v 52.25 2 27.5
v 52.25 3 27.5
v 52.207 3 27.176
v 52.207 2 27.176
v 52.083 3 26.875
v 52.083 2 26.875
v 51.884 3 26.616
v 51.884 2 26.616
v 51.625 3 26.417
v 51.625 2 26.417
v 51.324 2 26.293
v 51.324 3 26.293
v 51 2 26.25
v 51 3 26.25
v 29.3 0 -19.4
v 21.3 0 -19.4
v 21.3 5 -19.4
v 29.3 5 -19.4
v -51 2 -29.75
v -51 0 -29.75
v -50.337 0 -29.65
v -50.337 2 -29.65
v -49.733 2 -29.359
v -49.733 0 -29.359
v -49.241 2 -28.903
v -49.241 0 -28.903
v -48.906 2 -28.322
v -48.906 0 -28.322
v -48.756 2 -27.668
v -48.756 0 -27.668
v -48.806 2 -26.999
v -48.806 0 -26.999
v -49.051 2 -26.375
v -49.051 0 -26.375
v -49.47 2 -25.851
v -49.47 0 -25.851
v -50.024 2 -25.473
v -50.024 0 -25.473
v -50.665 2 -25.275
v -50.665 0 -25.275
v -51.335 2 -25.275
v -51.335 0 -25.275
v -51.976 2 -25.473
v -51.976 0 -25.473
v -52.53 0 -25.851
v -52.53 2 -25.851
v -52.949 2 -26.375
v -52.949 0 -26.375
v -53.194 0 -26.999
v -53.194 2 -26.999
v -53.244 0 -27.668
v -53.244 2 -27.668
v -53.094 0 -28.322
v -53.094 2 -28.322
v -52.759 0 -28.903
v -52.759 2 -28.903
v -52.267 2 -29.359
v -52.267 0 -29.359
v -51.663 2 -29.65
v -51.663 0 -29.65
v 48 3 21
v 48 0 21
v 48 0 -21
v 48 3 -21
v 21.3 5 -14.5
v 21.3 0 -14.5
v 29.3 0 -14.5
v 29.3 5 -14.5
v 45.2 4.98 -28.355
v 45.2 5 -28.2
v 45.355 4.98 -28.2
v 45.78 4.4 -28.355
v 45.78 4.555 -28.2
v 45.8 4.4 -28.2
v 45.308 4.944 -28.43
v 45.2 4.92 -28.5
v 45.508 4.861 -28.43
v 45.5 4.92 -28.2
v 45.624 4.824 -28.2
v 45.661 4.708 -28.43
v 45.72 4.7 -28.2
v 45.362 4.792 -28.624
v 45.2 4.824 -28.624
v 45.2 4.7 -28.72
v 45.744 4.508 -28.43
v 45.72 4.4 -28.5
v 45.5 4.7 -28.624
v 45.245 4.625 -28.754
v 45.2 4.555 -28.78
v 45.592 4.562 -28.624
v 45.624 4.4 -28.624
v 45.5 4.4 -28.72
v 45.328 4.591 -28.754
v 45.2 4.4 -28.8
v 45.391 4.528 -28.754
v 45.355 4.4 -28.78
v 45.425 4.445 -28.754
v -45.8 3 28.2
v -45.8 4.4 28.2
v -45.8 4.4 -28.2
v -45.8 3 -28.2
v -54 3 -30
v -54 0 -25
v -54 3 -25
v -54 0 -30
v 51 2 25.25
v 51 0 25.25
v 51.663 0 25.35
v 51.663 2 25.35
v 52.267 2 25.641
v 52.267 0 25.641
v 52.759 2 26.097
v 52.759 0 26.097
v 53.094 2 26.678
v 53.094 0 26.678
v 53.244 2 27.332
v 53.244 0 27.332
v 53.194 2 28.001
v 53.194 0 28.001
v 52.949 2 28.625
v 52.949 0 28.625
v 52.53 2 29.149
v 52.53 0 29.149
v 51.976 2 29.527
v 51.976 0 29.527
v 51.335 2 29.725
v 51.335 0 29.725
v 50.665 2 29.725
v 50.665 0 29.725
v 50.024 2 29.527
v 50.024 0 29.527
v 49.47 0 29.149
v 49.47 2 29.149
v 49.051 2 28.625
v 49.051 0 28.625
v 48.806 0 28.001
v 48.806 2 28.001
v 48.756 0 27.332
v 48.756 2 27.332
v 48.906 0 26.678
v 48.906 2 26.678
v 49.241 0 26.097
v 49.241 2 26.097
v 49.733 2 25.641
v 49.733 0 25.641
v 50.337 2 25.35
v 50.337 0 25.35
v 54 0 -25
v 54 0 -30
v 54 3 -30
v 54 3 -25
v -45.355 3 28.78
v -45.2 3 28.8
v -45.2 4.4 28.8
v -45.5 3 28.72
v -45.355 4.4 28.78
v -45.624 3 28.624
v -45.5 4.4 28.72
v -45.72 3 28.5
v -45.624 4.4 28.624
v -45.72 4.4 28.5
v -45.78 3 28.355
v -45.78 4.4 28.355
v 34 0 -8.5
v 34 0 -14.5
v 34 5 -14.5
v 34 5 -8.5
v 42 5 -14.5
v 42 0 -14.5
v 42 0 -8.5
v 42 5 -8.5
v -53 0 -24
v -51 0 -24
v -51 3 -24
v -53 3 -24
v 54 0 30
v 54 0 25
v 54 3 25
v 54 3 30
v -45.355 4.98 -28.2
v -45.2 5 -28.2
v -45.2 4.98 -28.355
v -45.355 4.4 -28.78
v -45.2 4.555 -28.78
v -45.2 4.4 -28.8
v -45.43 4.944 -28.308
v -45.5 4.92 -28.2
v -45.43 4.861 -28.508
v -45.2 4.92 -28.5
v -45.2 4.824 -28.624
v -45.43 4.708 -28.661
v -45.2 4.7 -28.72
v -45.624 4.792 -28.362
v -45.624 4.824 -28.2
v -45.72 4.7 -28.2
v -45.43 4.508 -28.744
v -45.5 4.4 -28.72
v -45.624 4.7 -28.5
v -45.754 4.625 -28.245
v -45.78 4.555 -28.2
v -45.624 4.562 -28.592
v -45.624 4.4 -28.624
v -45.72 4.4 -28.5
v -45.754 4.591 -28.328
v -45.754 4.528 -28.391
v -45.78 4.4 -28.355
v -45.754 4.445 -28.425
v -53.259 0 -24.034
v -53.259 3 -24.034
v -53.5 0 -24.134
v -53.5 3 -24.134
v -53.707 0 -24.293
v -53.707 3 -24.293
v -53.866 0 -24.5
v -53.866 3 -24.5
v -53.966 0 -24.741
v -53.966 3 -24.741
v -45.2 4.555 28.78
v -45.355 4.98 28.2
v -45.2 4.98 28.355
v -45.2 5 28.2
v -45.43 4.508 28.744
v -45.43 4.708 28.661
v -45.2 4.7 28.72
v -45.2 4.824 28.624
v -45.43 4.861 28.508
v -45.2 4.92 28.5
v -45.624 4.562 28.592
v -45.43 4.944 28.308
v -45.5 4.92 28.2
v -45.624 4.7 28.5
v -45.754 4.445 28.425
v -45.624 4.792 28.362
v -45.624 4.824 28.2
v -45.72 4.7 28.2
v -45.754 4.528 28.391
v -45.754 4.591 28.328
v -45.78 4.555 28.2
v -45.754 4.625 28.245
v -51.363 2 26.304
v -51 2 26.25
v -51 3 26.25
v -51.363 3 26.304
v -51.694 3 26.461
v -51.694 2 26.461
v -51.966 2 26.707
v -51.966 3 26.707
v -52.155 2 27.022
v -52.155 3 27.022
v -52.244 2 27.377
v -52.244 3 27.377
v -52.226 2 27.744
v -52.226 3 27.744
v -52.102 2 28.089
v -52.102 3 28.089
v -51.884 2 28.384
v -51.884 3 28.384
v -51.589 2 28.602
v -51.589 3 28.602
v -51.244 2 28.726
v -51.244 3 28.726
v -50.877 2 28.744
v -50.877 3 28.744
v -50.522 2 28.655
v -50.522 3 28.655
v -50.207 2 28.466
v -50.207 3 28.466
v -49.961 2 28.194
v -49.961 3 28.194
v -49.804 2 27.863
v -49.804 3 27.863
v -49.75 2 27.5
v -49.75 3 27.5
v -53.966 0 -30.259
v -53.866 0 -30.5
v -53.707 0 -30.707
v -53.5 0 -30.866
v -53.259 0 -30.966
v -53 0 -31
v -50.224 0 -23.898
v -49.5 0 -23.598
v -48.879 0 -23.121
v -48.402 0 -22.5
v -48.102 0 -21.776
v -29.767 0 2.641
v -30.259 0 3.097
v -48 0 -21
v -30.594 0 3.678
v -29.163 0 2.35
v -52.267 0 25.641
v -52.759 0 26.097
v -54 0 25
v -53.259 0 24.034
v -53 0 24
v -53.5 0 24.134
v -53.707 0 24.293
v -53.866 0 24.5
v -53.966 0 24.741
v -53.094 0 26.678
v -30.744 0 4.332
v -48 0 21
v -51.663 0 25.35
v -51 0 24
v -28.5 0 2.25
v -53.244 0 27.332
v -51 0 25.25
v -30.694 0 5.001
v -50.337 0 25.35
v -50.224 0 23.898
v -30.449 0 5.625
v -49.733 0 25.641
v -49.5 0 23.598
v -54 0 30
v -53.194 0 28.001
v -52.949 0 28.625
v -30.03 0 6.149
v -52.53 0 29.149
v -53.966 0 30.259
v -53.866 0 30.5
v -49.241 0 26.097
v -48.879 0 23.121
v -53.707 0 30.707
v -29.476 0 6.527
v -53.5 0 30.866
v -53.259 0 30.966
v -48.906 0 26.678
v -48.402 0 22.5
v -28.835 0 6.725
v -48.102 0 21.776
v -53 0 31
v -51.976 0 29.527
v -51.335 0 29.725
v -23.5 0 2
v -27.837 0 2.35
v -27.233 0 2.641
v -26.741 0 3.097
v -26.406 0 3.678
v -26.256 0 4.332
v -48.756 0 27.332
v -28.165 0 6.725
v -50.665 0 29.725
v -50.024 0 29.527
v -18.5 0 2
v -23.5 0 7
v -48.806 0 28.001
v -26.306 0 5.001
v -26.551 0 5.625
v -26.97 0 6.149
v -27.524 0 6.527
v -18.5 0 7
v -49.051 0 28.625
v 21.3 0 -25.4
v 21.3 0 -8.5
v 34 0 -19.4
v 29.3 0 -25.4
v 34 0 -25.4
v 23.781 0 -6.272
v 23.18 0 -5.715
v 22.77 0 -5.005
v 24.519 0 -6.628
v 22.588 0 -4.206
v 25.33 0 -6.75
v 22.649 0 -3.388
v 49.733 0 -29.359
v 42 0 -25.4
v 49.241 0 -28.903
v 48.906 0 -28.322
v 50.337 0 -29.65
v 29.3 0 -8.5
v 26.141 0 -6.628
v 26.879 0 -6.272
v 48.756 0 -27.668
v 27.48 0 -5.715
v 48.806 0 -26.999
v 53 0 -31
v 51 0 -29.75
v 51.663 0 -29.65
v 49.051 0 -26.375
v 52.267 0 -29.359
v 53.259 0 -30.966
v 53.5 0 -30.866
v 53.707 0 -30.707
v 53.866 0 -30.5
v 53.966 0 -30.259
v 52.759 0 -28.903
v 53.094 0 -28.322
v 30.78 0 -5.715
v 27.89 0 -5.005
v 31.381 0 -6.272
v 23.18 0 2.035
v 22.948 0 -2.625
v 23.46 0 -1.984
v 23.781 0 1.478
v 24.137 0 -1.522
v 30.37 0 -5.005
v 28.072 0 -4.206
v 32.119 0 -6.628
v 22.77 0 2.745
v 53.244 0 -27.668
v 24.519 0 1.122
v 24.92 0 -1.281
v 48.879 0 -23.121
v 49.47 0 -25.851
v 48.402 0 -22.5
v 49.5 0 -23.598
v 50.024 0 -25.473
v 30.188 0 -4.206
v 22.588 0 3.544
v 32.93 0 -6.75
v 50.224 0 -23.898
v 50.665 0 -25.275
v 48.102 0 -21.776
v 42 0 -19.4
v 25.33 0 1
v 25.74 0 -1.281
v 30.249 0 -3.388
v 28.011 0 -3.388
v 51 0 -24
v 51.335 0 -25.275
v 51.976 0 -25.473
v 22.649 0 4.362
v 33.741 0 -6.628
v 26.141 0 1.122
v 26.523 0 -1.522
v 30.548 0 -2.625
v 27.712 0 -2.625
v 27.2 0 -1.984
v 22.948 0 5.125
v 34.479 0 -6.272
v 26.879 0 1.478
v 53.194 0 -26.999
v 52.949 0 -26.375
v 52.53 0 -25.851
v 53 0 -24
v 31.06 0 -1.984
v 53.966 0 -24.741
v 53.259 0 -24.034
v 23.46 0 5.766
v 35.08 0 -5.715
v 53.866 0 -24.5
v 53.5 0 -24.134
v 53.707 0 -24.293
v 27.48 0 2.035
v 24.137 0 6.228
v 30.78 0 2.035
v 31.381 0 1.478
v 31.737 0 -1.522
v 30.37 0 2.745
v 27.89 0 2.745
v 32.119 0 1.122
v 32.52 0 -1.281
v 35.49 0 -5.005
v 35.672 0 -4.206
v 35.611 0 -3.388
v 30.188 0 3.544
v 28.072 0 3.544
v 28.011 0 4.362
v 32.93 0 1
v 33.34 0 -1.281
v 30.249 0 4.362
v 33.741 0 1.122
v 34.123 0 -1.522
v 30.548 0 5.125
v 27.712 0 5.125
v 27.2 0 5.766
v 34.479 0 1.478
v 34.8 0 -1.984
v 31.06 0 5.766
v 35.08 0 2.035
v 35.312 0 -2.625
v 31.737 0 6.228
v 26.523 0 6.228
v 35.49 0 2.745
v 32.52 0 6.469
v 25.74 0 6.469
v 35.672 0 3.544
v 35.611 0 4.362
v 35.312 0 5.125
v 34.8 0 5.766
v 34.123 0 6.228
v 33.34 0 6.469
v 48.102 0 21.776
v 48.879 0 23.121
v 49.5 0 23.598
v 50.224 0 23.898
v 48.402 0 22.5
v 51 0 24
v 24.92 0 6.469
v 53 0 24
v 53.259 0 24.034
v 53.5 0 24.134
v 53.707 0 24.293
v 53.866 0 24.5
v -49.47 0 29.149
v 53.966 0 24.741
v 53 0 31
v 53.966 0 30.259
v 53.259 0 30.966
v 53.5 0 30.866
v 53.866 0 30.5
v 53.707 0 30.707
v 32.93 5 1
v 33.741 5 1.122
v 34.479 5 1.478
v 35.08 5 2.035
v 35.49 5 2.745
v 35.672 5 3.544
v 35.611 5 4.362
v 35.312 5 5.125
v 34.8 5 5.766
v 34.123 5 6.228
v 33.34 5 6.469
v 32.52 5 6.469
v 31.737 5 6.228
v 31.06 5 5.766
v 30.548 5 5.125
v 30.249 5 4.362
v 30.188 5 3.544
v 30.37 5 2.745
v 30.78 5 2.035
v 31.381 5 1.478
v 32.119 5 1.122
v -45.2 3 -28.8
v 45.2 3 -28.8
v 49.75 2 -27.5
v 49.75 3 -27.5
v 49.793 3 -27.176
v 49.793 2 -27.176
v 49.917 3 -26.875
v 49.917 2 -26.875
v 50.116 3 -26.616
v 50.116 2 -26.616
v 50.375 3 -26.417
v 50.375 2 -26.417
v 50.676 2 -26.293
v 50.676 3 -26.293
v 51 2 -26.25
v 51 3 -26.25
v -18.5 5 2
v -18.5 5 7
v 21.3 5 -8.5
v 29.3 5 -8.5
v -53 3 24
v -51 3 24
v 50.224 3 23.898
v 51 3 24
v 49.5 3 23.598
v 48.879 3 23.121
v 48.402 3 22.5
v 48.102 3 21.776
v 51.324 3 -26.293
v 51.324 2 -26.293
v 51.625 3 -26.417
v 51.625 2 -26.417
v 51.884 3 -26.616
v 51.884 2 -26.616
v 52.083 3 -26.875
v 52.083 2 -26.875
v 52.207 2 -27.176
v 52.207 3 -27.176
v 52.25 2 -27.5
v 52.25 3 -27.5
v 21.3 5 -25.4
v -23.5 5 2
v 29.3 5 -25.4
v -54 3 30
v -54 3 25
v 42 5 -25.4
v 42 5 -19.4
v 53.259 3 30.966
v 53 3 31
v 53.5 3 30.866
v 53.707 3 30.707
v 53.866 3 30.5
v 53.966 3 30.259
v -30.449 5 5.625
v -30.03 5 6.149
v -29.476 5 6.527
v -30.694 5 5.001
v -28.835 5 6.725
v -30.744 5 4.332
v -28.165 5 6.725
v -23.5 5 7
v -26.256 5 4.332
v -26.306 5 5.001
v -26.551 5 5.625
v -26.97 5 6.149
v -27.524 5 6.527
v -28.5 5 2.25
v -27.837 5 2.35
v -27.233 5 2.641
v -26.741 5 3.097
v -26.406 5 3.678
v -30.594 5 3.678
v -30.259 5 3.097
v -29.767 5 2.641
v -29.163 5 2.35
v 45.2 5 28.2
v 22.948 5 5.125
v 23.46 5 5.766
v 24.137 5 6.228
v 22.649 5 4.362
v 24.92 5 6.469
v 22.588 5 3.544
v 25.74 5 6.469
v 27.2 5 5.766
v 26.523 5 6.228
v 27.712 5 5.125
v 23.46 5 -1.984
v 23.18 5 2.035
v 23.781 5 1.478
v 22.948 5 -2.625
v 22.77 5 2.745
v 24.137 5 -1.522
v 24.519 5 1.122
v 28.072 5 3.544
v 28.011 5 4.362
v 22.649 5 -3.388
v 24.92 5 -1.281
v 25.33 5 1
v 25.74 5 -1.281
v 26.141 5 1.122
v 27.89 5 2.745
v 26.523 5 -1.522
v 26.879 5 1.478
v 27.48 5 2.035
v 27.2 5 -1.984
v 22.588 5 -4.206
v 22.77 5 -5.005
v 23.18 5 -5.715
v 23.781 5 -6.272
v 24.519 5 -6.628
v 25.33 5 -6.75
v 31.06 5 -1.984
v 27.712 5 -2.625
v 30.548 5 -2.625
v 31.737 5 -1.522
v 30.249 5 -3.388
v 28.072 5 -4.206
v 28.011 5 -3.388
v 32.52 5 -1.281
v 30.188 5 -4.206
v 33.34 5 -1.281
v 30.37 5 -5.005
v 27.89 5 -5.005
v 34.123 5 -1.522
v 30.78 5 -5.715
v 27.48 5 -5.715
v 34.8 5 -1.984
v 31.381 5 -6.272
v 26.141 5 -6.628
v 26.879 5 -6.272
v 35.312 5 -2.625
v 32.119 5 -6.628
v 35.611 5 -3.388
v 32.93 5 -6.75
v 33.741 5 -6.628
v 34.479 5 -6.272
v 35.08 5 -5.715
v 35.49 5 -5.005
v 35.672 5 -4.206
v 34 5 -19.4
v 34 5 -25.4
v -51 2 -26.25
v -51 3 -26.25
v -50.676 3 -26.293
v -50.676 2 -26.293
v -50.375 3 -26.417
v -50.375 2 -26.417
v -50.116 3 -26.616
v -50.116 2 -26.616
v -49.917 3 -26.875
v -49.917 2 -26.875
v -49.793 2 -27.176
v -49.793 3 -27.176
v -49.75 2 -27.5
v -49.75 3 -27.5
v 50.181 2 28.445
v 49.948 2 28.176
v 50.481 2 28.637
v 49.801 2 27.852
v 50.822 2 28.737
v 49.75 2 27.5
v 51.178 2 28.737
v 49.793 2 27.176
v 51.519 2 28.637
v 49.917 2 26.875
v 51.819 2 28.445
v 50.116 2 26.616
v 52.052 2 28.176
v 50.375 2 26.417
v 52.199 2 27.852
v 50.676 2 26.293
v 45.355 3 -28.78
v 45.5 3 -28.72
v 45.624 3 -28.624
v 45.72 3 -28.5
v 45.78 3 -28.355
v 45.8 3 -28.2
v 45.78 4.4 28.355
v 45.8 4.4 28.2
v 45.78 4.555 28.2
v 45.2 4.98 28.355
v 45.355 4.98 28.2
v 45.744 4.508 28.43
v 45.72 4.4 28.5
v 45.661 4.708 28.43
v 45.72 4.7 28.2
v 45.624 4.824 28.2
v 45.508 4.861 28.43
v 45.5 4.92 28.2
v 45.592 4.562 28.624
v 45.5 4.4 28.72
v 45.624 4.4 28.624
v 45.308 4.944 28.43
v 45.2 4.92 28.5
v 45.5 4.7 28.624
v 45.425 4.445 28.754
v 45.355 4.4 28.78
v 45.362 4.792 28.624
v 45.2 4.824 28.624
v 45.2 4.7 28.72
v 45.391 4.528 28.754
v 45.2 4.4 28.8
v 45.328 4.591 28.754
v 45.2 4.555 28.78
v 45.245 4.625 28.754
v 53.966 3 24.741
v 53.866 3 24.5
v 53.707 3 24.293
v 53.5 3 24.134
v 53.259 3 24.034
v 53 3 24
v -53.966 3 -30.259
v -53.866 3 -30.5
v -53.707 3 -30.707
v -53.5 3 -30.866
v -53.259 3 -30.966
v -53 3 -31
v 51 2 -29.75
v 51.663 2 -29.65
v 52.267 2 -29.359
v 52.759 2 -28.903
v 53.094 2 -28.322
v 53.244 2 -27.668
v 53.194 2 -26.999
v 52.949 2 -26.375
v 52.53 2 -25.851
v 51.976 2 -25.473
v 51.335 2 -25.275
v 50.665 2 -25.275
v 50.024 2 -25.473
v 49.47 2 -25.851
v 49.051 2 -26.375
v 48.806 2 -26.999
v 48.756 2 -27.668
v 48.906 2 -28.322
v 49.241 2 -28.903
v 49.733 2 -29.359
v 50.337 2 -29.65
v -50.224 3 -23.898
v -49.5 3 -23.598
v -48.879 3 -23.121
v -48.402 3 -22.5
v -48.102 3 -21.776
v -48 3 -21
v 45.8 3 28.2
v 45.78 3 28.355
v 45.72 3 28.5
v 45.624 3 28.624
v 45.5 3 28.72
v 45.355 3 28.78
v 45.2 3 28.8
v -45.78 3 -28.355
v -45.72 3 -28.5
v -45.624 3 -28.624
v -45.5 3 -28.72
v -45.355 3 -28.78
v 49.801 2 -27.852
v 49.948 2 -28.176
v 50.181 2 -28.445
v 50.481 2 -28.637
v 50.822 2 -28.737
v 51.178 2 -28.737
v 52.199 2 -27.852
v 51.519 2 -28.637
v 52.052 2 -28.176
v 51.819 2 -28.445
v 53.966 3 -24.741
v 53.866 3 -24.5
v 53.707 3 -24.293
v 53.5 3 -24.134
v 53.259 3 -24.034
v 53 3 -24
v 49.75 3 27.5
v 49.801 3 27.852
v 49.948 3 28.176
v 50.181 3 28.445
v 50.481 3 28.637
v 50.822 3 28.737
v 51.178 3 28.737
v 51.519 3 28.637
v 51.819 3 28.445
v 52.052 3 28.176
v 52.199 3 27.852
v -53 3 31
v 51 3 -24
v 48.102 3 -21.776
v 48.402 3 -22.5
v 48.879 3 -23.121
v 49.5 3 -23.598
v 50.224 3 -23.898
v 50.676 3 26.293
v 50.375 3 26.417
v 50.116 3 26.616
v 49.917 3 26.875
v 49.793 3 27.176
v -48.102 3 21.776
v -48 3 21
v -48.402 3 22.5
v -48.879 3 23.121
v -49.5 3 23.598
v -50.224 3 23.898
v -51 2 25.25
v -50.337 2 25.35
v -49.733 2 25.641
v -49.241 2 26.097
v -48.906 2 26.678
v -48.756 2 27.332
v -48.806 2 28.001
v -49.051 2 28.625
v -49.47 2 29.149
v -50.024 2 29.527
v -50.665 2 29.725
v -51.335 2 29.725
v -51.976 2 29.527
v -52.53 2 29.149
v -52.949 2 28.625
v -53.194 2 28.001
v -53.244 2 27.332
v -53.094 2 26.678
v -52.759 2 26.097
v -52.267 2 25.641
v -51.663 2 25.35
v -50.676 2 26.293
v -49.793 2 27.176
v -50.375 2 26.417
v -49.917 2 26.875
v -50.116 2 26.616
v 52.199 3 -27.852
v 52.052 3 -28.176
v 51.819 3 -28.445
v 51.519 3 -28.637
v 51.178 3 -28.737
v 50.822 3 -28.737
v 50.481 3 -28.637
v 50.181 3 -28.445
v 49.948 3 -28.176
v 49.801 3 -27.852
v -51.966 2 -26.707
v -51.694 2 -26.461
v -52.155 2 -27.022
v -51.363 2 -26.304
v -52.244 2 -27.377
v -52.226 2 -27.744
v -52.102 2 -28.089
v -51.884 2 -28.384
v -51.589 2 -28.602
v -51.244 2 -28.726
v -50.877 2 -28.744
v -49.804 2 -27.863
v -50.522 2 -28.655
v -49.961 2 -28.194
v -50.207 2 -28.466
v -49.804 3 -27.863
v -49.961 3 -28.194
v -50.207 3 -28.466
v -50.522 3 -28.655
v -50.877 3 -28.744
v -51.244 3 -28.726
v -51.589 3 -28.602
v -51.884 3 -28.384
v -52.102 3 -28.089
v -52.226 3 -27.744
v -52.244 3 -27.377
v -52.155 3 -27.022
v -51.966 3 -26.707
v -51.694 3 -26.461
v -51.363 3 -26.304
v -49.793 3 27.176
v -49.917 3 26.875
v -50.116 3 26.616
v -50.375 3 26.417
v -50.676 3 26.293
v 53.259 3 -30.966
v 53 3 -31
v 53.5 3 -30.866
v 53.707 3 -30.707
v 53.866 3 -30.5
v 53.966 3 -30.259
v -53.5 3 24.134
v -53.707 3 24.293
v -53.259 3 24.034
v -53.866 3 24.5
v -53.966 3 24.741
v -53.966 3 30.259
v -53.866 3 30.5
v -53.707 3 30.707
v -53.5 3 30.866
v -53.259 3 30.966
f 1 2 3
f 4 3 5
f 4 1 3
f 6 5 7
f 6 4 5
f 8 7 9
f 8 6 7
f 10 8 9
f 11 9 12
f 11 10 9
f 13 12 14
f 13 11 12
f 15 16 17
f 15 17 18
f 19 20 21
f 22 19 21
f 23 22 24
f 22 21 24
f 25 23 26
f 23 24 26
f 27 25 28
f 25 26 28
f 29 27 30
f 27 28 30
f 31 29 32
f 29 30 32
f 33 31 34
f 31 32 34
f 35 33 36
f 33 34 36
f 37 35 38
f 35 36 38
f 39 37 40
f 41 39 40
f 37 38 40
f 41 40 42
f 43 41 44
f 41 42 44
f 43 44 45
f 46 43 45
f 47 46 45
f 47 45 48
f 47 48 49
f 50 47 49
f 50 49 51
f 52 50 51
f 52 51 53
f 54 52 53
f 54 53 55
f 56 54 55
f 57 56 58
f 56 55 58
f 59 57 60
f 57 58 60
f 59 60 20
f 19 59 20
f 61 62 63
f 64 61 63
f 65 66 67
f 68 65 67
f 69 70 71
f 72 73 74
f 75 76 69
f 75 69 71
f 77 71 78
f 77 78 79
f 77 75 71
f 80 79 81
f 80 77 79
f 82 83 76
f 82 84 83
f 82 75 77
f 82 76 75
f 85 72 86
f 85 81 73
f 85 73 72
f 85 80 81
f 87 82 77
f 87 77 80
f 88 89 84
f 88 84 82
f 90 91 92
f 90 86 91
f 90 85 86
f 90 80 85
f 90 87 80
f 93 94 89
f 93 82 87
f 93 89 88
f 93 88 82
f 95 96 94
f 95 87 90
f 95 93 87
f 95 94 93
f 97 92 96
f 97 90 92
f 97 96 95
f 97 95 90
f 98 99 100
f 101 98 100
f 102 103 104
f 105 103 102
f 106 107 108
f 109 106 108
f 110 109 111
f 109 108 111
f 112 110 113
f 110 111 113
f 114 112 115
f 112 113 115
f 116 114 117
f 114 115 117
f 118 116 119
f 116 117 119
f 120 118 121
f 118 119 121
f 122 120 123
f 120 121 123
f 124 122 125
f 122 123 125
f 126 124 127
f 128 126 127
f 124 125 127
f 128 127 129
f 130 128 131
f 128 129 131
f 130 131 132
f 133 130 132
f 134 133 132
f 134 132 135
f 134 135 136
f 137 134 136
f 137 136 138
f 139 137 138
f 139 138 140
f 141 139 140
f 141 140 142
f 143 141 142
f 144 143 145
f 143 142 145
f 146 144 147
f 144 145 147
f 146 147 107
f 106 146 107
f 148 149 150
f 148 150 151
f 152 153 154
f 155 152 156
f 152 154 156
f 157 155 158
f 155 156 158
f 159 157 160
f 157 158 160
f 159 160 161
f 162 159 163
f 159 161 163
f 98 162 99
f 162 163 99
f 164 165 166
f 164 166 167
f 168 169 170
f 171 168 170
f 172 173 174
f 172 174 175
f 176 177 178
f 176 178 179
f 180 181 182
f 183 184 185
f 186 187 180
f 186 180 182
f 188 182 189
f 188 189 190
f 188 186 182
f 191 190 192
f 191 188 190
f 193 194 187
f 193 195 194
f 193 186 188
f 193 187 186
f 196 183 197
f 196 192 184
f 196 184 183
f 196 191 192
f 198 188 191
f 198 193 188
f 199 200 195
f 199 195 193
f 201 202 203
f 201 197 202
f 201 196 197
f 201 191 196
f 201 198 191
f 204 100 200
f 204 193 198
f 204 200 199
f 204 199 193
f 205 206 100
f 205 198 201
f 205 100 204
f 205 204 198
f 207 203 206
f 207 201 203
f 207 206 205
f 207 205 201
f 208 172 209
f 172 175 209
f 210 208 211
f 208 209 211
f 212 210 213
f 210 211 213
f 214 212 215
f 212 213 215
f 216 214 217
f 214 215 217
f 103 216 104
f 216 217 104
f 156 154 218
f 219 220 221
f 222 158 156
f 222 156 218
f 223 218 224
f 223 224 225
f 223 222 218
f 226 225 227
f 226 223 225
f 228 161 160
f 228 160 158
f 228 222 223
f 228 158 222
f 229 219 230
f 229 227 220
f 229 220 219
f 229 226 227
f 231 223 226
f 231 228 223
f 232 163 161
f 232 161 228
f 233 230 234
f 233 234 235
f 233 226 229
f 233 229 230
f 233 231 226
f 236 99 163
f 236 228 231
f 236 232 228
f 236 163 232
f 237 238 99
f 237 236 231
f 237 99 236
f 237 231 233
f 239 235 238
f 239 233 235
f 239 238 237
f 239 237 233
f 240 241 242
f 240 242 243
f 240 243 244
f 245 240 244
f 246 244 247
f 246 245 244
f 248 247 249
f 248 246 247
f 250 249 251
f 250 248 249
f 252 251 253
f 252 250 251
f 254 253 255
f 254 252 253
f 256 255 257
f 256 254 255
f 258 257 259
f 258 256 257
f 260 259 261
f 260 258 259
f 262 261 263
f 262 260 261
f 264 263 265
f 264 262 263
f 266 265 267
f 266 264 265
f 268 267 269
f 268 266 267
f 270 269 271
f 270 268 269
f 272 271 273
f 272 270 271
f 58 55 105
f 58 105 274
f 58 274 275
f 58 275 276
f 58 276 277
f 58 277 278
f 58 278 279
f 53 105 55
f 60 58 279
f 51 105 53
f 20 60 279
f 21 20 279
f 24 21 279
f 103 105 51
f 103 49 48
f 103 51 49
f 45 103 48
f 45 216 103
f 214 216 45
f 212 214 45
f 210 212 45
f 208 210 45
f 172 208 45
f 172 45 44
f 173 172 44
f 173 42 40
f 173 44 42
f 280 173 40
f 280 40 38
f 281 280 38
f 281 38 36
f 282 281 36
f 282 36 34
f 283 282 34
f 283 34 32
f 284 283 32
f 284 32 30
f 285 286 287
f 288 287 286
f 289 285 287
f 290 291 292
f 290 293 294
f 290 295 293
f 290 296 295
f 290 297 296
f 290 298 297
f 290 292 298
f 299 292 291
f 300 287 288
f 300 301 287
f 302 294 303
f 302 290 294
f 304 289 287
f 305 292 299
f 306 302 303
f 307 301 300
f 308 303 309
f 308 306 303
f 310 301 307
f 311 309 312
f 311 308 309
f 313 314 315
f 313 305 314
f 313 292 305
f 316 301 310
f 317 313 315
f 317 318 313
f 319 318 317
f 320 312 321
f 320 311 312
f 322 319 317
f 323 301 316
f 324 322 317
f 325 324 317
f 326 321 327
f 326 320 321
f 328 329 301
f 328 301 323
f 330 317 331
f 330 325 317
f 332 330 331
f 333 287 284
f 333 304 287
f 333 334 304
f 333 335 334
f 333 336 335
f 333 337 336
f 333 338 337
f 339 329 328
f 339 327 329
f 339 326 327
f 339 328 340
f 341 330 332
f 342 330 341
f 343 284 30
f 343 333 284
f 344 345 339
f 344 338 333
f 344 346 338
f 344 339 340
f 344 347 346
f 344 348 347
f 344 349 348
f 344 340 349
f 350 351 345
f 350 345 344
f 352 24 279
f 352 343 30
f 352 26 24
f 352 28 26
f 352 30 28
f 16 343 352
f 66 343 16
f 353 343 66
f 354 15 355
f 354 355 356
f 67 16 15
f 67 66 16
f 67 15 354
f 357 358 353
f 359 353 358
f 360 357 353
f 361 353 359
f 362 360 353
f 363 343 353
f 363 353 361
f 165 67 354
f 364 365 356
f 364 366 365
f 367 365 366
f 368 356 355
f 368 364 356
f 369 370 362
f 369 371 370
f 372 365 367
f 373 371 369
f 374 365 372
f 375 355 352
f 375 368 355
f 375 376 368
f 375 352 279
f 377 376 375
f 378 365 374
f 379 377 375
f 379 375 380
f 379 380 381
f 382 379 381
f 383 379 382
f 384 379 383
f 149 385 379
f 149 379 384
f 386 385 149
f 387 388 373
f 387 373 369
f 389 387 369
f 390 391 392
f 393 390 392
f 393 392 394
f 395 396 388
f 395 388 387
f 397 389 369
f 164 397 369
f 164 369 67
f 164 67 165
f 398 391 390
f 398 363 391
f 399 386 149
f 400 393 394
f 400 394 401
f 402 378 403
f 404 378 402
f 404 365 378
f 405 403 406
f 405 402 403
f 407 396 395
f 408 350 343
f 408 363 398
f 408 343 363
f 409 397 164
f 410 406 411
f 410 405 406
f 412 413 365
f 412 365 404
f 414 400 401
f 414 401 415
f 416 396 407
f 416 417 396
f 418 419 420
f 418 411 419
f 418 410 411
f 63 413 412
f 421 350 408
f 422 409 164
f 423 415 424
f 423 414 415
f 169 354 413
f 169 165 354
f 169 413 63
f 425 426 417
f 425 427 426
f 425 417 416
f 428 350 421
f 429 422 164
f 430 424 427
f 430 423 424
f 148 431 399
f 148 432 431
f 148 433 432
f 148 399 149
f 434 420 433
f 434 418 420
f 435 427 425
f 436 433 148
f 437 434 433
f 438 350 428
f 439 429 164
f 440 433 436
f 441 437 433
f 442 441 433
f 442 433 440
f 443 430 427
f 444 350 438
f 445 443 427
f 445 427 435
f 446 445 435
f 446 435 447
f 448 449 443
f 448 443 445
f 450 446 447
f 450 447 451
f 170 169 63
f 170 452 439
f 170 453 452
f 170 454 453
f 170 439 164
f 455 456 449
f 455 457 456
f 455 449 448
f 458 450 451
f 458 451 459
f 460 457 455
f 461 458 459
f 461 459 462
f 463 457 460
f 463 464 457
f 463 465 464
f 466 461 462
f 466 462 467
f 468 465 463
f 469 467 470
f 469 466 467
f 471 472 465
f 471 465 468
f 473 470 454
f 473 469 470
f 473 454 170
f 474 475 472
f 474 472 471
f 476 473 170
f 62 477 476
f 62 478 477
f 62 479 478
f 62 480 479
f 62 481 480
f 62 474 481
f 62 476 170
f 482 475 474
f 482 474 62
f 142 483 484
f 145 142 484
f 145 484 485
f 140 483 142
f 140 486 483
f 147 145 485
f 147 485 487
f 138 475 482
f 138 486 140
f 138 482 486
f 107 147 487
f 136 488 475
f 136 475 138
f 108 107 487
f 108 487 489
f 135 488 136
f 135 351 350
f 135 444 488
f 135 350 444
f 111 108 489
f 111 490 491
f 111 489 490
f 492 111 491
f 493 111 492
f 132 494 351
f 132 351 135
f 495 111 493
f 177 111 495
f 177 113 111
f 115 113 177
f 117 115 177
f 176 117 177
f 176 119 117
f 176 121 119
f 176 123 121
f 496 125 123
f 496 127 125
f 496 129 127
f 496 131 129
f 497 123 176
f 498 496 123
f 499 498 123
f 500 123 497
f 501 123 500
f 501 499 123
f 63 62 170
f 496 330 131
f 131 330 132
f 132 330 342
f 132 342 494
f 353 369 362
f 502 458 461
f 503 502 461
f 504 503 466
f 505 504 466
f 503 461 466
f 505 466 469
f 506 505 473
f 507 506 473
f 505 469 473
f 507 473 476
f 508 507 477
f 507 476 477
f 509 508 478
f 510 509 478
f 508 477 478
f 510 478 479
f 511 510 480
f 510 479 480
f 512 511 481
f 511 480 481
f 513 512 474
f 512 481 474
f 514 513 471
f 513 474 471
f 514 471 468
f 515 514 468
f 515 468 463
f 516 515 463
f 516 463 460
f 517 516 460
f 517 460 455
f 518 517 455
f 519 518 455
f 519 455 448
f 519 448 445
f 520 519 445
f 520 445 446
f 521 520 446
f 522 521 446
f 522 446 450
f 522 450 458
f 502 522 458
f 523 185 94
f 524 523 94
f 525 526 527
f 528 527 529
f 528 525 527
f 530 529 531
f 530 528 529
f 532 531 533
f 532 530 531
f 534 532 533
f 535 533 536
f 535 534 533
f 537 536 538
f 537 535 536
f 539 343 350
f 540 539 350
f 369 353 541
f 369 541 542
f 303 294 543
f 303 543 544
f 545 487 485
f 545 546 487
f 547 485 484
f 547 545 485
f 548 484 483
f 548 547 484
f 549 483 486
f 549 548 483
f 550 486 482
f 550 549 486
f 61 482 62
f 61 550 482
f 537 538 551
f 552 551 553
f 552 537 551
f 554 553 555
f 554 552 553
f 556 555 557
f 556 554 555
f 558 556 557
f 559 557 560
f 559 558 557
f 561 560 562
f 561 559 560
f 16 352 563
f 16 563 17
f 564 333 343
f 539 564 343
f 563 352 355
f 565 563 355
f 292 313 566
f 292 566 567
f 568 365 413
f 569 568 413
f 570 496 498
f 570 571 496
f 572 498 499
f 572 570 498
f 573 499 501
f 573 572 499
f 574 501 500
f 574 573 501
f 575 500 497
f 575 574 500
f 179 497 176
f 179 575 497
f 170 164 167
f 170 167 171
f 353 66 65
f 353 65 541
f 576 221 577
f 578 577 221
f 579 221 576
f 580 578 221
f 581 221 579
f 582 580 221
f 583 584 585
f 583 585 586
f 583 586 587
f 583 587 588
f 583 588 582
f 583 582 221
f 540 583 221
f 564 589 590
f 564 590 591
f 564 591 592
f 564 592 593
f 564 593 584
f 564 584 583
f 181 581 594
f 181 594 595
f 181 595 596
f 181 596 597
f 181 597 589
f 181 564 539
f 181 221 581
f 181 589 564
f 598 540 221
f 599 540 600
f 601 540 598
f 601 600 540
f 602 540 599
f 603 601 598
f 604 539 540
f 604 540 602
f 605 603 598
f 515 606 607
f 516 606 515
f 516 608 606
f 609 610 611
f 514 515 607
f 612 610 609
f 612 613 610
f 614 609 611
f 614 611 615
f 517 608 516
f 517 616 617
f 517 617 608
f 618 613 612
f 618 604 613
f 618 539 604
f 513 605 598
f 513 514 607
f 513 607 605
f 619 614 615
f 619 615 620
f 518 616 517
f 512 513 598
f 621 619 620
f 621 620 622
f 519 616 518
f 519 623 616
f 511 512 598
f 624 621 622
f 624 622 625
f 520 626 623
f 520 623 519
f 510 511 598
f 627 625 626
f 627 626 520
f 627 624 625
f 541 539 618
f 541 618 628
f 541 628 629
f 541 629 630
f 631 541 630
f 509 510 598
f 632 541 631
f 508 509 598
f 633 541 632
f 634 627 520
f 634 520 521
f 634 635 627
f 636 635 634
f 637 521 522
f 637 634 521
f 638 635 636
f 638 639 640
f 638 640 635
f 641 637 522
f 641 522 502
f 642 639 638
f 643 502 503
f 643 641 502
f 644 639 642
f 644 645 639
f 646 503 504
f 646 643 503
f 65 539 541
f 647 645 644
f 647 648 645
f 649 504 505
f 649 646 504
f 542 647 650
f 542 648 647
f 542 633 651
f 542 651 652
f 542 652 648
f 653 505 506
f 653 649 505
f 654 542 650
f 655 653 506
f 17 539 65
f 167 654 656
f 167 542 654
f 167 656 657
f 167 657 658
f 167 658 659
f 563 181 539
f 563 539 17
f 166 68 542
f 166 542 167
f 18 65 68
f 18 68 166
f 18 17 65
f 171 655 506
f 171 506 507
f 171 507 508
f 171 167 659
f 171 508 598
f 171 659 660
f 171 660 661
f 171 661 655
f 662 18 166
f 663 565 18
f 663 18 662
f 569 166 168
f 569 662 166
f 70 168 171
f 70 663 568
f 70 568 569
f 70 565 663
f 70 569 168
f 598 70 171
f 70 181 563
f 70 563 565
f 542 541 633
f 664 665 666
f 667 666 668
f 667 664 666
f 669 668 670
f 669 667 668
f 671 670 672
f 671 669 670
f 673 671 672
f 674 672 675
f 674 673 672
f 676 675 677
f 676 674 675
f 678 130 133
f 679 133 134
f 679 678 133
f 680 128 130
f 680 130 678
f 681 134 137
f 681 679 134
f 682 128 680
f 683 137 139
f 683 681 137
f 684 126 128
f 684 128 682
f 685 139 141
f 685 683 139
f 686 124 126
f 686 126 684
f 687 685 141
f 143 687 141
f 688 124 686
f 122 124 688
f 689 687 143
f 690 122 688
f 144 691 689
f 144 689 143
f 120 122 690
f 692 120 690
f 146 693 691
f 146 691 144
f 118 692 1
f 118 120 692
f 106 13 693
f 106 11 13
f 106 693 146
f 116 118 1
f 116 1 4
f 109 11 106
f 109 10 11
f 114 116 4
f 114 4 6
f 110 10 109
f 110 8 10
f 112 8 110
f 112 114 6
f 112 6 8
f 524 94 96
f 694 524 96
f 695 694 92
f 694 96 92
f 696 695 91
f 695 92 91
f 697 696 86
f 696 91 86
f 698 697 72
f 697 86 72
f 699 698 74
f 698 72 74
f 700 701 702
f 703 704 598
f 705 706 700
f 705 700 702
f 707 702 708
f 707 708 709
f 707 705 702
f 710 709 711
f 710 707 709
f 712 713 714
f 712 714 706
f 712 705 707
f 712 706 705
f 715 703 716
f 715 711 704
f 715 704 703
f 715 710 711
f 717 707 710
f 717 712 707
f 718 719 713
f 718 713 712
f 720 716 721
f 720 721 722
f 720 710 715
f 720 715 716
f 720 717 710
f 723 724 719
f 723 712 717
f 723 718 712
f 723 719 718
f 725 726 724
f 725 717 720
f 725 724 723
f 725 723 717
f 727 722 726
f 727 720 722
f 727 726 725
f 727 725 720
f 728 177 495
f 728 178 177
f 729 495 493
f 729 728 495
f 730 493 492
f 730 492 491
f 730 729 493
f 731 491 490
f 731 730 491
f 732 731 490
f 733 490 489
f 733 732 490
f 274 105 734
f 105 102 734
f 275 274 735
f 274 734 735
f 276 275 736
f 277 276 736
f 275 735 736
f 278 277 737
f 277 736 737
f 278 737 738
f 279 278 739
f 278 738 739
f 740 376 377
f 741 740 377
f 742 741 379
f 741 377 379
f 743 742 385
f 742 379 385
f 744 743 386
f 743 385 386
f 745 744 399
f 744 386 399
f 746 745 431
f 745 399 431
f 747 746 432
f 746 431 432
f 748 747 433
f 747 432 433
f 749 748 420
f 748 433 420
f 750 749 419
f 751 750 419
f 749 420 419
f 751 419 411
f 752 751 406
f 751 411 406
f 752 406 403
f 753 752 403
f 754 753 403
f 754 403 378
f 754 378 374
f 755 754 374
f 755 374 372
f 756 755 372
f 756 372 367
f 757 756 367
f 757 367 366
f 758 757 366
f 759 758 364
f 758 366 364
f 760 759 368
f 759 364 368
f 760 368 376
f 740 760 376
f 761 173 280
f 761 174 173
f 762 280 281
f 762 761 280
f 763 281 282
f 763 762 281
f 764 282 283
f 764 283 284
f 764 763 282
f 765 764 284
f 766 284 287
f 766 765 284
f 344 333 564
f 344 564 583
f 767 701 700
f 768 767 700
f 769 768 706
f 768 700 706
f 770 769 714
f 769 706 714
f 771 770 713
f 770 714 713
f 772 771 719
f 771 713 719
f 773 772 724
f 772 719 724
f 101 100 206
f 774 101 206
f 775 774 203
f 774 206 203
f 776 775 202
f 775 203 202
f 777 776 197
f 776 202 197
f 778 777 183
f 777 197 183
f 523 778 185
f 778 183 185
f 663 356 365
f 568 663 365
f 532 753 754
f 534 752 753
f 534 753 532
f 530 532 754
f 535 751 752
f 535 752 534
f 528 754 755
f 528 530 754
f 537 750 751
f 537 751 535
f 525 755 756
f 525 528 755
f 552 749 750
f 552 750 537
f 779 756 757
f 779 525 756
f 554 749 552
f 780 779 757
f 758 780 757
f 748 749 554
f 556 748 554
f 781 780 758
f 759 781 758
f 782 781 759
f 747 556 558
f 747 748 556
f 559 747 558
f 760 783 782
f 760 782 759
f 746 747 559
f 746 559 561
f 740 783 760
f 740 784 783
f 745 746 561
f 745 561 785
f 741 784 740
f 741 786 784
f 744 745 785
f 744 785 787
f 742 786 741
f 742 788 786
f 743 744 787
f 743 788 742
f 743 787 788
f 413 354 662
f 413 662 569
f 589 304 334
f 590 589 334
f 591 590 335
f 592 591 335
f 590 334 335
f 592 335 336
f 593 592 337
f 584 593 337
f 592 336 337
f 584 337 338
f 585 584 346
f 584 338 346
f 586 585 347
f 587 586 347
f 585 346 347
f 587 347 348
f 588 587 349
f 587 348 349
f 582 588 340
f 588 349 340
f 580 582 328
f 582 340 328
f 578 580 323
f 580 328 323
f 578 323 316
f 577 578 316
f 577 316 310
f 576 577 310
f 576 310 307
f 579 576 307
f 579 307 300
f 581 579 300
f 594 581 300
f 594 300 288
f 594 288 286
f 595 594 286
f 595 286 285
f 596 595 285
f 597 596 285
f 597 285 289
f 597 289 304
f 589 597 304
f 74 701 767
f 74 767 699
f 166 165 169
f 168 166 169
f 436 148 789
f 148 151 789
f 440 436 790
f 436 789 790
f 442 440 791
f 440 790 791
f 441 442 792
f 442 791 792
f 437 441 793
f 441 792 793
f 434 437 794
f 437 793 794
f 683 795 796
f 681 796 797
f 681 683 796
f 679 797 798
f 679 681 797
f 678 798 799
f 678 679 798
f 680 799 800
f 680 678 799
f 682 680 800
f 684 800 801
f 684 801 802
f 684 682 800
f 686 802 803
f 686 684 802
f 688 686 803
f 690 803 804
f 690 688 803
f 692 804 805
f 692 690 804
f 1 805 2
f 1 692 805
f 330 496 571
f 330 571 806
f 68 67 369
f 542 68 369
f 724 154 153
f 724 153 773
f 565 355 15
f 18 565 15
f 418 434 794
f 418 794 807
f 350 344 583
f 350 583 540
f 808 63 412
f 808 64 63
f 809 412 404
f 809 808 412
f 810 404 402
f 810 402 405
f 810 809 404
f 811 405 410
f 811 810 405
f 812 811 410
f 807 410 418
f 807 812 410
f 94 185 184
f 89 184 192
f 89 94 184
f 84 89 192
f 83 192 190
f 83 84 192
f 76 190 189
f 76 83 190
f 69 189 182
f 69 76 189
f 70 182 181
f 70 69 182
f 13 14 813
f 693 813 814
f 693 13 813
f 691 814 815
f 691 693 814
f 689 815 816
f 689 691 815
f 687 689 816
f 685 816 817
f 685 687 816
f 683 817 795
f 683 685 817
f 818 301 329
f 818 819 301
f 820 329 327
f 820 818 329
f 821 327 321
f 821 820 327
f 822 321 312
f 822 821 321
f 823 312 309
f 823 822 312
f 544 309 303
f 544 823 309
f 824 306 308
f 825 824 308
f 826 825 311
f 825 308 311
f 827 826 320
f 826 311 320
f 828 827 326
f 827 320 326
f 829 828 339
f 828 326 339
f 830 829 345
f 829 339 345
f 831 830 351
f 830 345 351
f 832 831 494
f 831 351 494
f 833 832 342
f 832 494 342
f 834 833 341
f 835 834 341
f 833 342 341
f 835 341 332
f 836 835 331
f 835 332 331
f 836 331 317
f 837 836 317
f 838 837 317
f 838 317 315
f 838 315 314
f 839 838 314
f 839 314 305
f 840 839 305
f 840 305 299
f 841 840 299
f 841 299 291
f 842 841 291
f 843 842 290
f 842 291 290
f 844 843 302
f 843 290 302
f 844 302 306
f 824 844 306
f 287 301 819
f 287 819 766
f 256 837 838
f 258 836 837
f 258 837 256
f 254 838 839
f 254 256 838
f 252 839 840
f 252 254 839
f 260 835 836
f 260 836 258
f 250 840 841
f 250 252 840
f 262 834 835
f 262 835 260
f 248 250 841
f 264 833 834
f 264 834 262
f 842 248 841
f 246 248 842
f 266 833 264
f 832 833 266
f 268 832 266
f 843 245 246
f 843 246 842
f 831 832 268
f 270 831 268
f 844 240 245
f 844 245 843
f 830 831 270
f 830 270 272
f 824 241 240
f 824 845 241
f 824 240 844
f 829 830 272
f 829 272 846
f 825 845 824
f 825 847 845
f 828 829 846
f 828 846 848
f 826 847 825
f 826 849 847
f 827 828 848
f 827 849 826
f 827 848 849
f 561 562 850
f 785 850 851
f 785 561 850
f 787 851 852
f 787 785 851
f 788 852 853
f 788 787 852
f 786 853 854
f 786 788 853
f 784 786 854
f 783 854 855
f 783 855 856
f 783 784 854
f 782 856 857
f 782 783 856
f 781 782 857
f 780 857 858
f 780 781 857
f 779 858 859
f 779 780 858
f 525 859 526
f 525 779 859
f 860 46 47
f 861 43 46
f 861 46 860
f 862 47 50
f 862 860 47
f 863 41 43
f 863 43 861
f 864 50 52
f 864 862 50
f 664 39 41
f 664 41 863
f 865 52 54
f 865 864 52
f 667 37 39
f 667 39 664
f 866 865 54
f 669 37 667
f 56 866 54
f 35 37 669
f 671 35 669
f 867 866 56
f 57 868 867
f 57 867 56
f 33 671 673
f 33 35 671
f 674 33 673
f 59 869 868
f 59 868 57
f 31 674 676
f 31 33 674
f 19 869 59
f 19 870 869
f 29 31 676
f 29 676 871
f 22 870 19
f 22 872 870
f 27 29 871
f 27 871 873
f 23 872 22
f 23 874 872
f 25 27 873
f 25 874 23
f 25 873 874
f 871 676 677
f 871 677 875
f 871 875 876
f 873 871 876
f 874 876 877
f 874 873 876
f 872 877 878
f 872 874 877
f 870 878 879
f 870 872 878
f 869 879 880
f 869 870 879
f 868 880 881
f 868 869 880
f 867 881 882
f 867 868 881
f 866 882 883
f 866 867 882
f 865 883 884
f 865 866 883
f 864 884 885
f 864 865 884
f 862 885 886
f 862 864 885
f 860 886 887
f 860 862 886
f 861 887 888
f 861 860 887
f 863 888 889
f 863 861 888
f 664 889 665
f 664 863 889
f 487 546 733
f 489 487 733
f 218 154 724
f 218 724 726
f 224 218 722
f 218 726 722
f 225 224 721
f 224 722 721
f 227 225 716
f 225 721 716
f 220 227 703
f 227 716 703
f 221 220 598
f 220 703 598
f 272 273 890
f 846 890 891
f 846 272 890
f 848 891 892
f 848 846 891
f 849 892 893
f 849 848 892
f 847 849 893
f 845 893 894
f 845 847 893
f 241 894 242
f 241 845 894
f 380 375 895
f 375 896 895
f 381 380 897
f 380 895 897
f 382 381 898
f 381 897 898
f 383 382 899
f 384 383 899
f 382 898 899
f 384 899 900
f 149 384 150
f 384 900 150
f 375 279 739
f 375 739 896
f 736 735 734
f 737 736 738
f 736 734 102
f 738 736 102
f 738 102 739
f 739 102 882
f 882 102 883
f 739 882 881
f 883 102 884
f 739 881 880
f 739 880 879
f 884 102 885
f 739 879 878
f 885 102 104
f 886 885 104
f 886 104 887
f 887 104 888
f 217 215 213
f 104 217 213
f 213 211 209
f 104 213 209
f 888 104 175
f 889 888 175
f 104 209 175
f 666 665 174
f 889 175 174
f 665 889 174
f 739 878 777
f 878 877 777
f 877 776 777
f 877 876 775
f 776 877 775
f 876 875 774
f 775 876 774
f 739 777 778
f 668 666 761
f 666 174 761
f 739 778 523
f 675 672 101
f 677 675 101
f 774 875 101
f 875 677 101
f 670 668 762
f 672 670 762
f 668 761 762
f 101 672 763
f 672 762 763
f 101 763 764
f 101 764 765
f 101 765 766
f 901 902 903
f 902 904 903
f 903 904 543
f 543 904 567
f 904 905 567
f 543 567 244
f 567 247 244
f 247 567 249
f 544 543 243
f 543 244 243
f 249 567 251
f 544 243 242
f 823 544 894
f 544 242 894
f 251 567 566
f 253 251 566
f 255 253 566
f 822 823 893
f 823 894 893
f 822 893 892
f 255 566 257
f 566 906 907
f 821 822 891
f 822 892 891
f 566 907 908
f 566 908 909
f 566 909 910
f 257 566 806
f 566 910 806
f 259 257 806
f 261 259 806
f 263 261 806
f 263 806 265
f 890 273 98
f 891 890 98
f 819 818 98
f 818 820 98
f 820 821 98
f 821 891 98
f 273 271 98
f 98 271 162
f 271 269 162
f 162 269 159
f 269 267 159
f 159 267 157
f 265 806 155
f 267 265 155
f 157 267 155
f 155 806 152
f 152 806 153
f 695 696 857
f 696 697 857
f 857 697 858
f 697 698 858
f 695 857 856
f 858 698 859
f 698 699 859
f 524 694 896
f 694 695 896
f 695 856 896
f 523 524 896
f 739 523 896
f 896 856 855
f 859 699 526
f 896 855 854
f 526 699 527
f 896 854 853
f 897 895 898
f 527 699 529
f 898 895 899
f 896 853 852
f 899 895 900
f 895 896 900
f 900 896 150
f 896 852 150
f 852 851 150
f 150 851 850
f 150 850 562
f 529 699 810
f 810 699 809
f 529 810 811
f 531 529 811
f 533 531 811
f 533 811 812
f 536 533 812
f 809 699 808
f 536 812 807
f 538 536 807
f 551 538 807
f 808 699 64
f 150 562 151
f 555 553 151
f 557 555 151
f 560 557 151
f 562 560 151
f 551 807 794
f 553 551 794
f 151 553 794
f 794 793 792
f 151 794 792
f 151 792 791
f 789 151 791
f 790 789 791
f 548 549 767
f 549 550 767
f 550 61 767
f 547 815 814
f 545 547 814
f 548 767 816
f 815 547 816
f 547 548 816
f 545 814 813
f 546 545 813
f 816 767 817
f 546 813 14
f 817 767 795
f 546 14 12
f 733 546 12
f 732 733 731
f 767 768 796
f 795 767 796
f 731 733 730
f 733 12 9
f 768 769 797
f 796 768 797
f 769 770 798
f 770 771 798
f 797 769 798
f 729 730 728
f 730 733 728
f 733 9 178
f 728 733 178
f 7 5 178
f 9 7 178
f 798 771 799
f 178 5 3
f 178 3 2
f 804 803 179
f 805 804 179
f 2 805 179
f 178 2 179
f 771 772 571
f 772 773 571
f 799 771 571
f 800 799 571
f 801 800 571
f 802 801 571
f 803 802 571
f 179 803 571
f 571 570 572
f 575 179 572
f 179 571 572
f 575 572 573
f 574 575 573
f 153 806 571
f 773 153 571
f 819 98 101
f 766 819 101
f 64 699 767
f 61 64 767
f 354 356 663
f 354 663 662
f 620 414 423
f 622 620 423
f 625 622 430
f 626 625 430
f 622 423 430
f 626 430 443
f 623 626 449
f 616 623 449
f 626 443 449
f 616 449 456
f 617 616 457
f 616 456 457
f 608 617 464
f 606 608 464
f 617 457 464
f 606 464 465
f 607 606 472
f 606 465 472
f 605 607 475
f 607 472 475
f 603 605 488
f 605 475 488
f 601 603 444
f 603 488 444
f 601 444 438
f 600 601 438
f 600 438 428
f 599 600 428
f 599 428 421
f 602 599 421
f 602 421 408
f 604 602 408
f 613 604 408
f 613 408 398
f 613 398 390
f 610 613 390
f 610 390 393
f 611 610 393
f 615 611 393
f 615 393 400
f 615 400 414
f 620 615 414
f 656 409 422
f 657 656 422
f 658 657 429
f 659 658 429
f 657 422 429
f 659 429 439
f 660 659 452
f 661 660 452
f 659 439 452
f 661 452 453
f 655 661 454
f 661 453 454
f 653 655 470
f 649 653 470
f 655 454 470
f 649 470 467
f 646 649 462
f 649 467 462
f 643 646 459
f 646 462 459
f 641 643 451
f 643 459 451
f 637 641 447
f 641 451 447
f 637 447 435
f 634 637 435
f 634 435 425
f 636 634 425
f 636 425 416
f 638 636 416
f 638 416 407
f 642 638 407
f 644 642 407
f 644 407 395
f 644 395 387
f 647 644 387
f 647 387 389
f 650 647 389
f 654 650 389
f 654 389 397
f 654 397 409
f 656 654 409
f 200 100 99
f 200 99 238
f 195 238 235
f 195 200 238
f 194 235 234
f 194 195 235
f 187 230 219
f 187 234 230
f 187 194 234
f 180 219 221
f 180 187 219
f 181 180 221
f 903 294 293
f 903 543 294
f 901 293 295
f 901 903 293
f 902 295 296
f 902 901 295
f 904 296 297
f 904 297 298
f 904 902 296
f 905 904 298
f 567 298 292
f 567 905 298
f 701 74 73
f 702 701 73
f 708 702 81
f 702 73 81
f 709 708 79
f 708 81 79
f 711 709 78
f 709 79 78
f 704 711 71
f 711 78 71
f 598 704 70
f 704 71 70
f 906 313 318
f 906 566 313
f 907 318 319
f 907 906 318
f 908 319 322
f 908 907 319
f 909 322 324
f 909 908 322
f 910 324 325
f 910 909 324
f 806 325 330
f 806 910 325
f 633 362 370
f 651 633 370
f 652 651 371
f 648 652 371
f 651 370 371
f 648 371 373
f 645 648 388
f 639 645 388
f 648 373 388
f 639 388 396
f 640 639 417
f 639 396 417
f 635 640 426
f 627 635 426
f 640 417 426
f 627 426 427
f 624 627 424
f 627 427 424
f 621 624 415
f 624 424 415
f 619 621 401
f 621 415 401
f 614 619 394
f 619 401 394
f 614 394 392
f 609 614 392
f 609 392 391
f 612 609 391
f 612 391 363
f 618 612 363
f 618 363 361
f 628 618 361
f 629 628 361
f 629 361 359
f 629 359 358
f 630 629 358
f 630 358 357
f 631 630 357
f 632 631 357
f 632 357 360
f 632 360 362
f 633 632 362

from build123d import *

# Parameters (mm, degrees)
SKETCH_1_W          = 96
SKETCH_1_H          = 62
EXTRUDE_1_DEPTH     = 5
SKETCH_2_W          = 96
SKETCH_2_H          = 62
SKETCH_2_W_2        = 91.6
SKETCH_2_H_2        = 57.6
CUT_EXTRUDE_1_DEPTH = 2
EXTRUDE_2_DEPTH     = 3
FILLET_1_R          = 3
FILLET_2_R          = 1
FILLET_3_R          = 0.6
FILLET_4_R          = 0.6
SKETCH_5_R          = 2.25
CUT_EXTRUDE_2_DEPTH = 2
SKETCH_6_R          = 2.25
SKETCH_6_W          = 5
SKETCH_6_H          = 5
SKETCH_6_R_2        = 2.75
SKETCH_6_W_2        = 8
SKETCH_6_H_2        = 6
CUT_EXTRUDE_3_DEPTH = 63.465990747


with BuildPart() as part:
    # Эскиз1 → Бобышка-Вытянуть1 (new body)
    with BuildSketch(Plane(origin=(0, 0, 0), x_dir=(1, 0, 0), z_dir=(0, 1, 0))):
        Rectangle(SKETCH_1_W, SKETCH_1_H)
    extrude(amount=EXTRUDE_1_DEPTH)

    # Эскиз2 → Вырез-Вытянуть1 (cut)
    with BuildSketch(Plane(origin=(0, 5, 0), x_dir=(1, 0, 0), z_dir=(0, 1, 0))):
        Rectangle(SKETCH_2_W, SKETCH_2_H)
        Rectangle(SKETCH_2_W_2, SKETCH_2_H_2, mode=Mode.SUBTRACT)
    extrude(amount=-CUT_EXTRUDE_1_DEPTH, mode=Mode.SUBTRACT)

    # Эскиз4 → Бобышка-Вытянуть2 (add)
    with BuildSketch(Plane.XZ):
        with BuildLine():
            Line((-54, 31), (-54, 24))
            Line((-54, 24), (-51, 24))
            Line((-51, 24), (-51, 26.25))
            ThreePointArc((-51, 26.25), (-51.883883476, 28.383883476), (-49.75, 27.5))
            Line((-49.75, 27.5), (-48, 27.5))
            Line((-48, 27.5), (-48, 31))
            Line((-48, 31), (-54, 31))
        make_face()
        with BuildLine():
            Line((-51, 26.25), (-51, 24))
            Line((-51, 24), (-48, 24))
            Line((-48, 24), (-48, 27.5))
            Line((-48, 27.5), (-49.75, 27.5))
            ThreePointArc((-49.75, 27.5), (-50.116116524, 26.616116524), (-51, 26.25))
        make_face()
        with BuildLine():
            Line((-54, -24), (-54, -31))
            Line((-54, -31), (-48, -31))
            Line((-48, -31), (-48, -27.5))
            Line((-48, -27.5), (-49.75, -27.5))
            ThreePointArc((-49.75, -27.5), (-51.883883476, -28.383883476), (-51, -26.25))
            Line((-51, -26.25), (-51, -24))
            Line((-51, -24), (-54, -24))
        make_face()
        with BuildLine():
            Line((-49.75, -27.5), (-48, -27.5))
            Line((-48, -27.5), (-48, -24))
            Line((-48, -24), (-51, -24))
            Line((-51, -24), (-51, -26.25))
            ThreePointArc((-51, -26.25), (-50.116116524, -26.616116524), (-49.75, -27.5))
        make_face()
        with BuildLine():
            Line((48, -27.5), (48, -31))
            Line((48, -31), (54, -31))
            Line((54, -31), (54, -24))
            Line((54, -24), (51, -24))
            Line((51, -24), (51, -26.25))
            ThreePointArc((51, -26.25), (51.883883476, -26.616116524), (52.25, -27.5))
            ThreePointArc((52.25, -27.5), (51, -28.75), (49.75, -27.5))
            Line((49.75, -27.5), (48, -27.5))
        make_face()
        with BuildLine():
            Line((48, -24), (48, -27.5))
            Line((48, -27.5), (49.75, -27.5))
            ThreePointArc((49.75, -27.5), (50.116116524, -26.616116524), (51, -26.25))
            Line((51, -26.25), (51, -24))
            Line((51, -24), (48, -24))
        make_face()
        with BuildLine():
            Line((51, 24), (54, 24))
            Line((54, 24), (54, 31))
            Line((54, 31), (48, 31))
            Line((48, 31), (48, 27.5))
            Line((48, 27.5), (49.75, 27.5))
            ThreePointArc((49.75, 27.5), (51, 28.75), (52.25, 27.5))
            ThreePointArc((52.25, 27.5), (51.883883476, 26.616116524), (51, 26.25))
            Line((51, 26.25), (51, 24))
        make_face()
        with BuildLine():
            Line((48, 27.5), (48, 24))
            Line((48, 24), (51, 24))
            Line((51, 24), (51, 26.25))
            ThreePointArc((51, 26.25), (50.116116524, 26.616116524), (49.75, 27.5))
            Line((49.75, 27.5), (48, 27.5))
        make_face()
    extrude(amount=-EXTRUDE_2_DEPTH)

    # Скругление1
    fillet_1_edges = [part.edges().sort_by_distance(p)[0] for p in [
        (-48, 1.5, 24),
        (-48, 1.5, -24),
        (48, 1.5, -24),
        (48, 1.5, 24),
    ]]
    fillet(fillet_1_edges, radius=FILLET_1_R)

    # Скругление2
    fillet_2_edges = [part.edges().sort_by_distance(p)[0] for p in [
        (-54, 1.5, 24),
        (-54, 1.5, 31),
        (-54, 1.5, -31),
        (-54, 1.5, -24),
        (54, 1.5, -24),
        (54, 1.5, -31),
        (54, 1.5, 31),
        (54, 1.5, 24),
    ]]
    fillet(fillet_2_edges, radius=FILLET_2_R)

    # Скругление3
    fillet_3_edges = [part.edges().sort_by_distance(p)[0] for p in [
        (45.8, 5, 0),
        (0, 5, 28.8),
        (-45.8, 5, 0),
        (0, 5, -28.8),
    ]]
    fillet(fillet_3_edges, radius=FILLET_3_R)

    # Скругление4
    # the kernel refuses this fillet: 0.6 mm, written as the material it takes off along each edge
    with BuildSketch(Plane(origin=(-45.2, 4.4, -28.2), x_dir=(0, 0, -1), z_dir=(-1, 0, 0))) as fillet_4_piece_1_section:
        Polygon((0, 0), (FILLET_4_R * 1.02, 0), (FILLET_4_R * 1.02, -FILLET_4_R * 1.02), (0, -FILLET_4_R * 1.02), align=None)
    fillet_4_piece_1 = extrude(amount=FILLET_4_R * 1.02, mode=Mode.PRIVATE)
    fillet_4_piece_1 = fillet_4_piece_1 - Plane(origin=(-45.2, 4.4, -28.2), x_dir=(0, -0.7071067811865475, 0.7071067811865475), z_dir=(-1, 0, 0)) * Sphere(FILLET_4_R, mode=Mode.PRIVATE)
    add(fillet_4_piece_1, mode=Mode.SUBTRACT)
    with BuildSketch(Plane(origin=(45.2, 4.4, -28.2), x_dir=(1, 0, 0), z_dir=(0, 0, -1))) as fillet_4_piece_2_section:
        Polygon((0, 0), (FILLET_4_R * 1.02, 0), (FILLET_4_R * 1.02, -FILLET_4_R * 1.02), (0, -FILLET_4_R * 1.02), align=None)
    fillet_4_piece_2 = extrude(amount=FILLET_4_R * 1.02, mode=Mode.PRIVATE)
    fillet_4_piece_2 = fillet_4_piece_2 - Plane(origin=(45.2, 4.4, -28.2), x_dir=(-0.7071067811865475, -0.7071067811865475, 0), z_dir=(0, 0, -1)) * Sphere(FILLET_4_R, mode=Mode.PRIVATE)
    add(fillet_4_piece_2, mode=Mode.SUBTRACT)
    with BuildSketch(Plane(origin=(-45.2, 4.4, 28.2), x_dir=(0, 0, 1), z_dir=(-1, 0, 0))) as fillet_4_piece_3_section:
        Polygon((0, 0), (FILLET_4_R * 1.02, 0), (FILLET_4_R * 1.02, FILLET_4_R * 1.02), (0, FILLET_4_R * 1.02), align=None)
    fillet_4_piece_3 = extrude(amount=FILLET_4_R * 1.02, mode=Mode.PRIVATE)
    fillet_4_piece_3 = fillet_4_piece_3 - Plane(origin=(-45.2, 4.4, 28.2), x_dir=(0, -0.7071067811865475, -0.7071067811865475), z_dir=(-1, 0, 0)) * Sphere(FILLET_4_R, mode=Mode.PRIVATE)
    add(fillet_4_piece_3, mode=Mode.SUBTRACT)
    with BuildSketch(Plane(origin=(45.2, 4.4, 28.2), x_dir=(1, 0, 0), z_dir=(0, 0, 1))) as fillet_4_piece_4_section:
        Polygon((0, 0), (FILLET_4_R * 1.02, 0), (FILLET_4_R * 1.02, FILLET_4_R * 1.02), (0, FILLET_4_R * 1.02), align=None)
    fillet_4_piece_4 = extrude(amount=FILLET_4_R * 1.02, mode=Mode.PRIVATE)
    fillet_4_piece_4 = fillet_4_piece_4 - Plane(origin=(45.2, 4.4, 28.2), x_dir=(-0.7071067811865475, -0.7071067811865475, 0), z_dir=(0, 0, 1)) * Sphere(FILLET_4_R, mode=Mode.PRIVATE)
    add(fillet_4_piece_4, mode=Mode.SUBTRACT)
    with BuildSketch(Plane(origin=(45.8, 4.4, 28.8), x_dir=(-1, 0, 0), z_dir=(0, -1, 0)), Plane(origin=(-45.8, 4.4, 28.8), x_dir=(0, 0, -1), z_dir=(0, -1, 0))) as fillet_4_piece_5:
        with BuildLine():
            CenterArc((FILLET_4_R, FILLET_4_R), FILLET_4_R, 180, 90)
            Line((0, FILLET_4_R), (0, 0))
            Line((0, 0), (FILLET_4_R, 0))
        make_face()
    extrude(amount=1.4, mode=Mode.SUBTRACT)
    with BuildSketch(Plane(origin=(-45.8, 4.4, -28.8), x_dir=(0, 0, 1), z_dir=(0, -1, 0)), Plane(origin=(45.8, 4.4, -28.8), x_dir=(-1, 0, 0), z_dir=(0, -1, 0))) as fillet_4_piece_6:
        with BuildLine():
            CenterArc((FILLET_4_R, -FILLET_4_R), FILLET_4_R, 90, 90)
            Line((0, -FILLET_4_R), (0, 0))
            Line((0, 0), (FILLET_4_R, 0))
        make_face()
    extrude(amount=1.4, mode=Mode.SUBTRACT)

    # Эскиз5 → Вырез-Вытянуть2 (cut)
    with BuildSketch(Plane.XZ):
        with Locations(Location((-51, 27.5, 0), (0, 0, 270))):
            Circle(SKETCH_5_R)
        with Locations(Location((51, 27.5, 0), (0, 0, 270))):
            Circle(SKETCH_5_R)
        with Locations(Location((-51, -27.5, 0), (0, 0, 270))):
            Circle(SKETCH_5_R)
        with Locations(Location((51, -27.5, 0), (0, 0, 270))):
            Circle(SKETCH_5_R)
    extrude(amount=-CUT_EXTRUDE_2_DEPTH, mode=Mode.SUBTRACT)

    # Эскиз6 → Вырез-Вытянуть3 (cut, through all)
    with BuildSketch(Plane.XZ):
        with Locations(Location((-28.5, 4.5, 0), (0, 0, 270))):
            Circle(SKETCH_6_R)
        with Locations((-21, 4.5)):
            Rectangle(SKETCH_6_W, SKETCH_6_H)
        with Locations(Location((25.33, -4, 0), (0, 0, 270))):
            Circle(SKETCH_6_R_2)
        with Locations(Location((32.93, -4, 0), (0, 0, 270))):
            Circle(SKETCH_6_R_2)
        with Locations(Location((32.93, 3.75, 0), (0, 0, 270))):
            Circle(SKETCH_6_R_2)
        with Locations(Location((25.33, 3.75, 0), (0, 0, 270))):
            Circle(SKETCH_6_R_2)
        with Locations((25.3, -11.5)):
            Rectangle(SKETCH_6_W_2, SKETCH_6_H_2)
        with Locations((25.3, -22.4)):
            Rectangle(SKETCH_6_W_2, SKETCH_6_H_2)
        with Locations((38, -22.4)):
            Rectangle(SKETCH_6_W_2, SKETCH_6_H_2)
        with Locations((38, -11.5)):
            Rectangle(SKETCH_6_W_2, SKETCH_6_H_2)
    extrude(amount=-CUT_EXTRUDE_3_DEPTH, mode=Mode.SUBTRACT)


solid = part.part
